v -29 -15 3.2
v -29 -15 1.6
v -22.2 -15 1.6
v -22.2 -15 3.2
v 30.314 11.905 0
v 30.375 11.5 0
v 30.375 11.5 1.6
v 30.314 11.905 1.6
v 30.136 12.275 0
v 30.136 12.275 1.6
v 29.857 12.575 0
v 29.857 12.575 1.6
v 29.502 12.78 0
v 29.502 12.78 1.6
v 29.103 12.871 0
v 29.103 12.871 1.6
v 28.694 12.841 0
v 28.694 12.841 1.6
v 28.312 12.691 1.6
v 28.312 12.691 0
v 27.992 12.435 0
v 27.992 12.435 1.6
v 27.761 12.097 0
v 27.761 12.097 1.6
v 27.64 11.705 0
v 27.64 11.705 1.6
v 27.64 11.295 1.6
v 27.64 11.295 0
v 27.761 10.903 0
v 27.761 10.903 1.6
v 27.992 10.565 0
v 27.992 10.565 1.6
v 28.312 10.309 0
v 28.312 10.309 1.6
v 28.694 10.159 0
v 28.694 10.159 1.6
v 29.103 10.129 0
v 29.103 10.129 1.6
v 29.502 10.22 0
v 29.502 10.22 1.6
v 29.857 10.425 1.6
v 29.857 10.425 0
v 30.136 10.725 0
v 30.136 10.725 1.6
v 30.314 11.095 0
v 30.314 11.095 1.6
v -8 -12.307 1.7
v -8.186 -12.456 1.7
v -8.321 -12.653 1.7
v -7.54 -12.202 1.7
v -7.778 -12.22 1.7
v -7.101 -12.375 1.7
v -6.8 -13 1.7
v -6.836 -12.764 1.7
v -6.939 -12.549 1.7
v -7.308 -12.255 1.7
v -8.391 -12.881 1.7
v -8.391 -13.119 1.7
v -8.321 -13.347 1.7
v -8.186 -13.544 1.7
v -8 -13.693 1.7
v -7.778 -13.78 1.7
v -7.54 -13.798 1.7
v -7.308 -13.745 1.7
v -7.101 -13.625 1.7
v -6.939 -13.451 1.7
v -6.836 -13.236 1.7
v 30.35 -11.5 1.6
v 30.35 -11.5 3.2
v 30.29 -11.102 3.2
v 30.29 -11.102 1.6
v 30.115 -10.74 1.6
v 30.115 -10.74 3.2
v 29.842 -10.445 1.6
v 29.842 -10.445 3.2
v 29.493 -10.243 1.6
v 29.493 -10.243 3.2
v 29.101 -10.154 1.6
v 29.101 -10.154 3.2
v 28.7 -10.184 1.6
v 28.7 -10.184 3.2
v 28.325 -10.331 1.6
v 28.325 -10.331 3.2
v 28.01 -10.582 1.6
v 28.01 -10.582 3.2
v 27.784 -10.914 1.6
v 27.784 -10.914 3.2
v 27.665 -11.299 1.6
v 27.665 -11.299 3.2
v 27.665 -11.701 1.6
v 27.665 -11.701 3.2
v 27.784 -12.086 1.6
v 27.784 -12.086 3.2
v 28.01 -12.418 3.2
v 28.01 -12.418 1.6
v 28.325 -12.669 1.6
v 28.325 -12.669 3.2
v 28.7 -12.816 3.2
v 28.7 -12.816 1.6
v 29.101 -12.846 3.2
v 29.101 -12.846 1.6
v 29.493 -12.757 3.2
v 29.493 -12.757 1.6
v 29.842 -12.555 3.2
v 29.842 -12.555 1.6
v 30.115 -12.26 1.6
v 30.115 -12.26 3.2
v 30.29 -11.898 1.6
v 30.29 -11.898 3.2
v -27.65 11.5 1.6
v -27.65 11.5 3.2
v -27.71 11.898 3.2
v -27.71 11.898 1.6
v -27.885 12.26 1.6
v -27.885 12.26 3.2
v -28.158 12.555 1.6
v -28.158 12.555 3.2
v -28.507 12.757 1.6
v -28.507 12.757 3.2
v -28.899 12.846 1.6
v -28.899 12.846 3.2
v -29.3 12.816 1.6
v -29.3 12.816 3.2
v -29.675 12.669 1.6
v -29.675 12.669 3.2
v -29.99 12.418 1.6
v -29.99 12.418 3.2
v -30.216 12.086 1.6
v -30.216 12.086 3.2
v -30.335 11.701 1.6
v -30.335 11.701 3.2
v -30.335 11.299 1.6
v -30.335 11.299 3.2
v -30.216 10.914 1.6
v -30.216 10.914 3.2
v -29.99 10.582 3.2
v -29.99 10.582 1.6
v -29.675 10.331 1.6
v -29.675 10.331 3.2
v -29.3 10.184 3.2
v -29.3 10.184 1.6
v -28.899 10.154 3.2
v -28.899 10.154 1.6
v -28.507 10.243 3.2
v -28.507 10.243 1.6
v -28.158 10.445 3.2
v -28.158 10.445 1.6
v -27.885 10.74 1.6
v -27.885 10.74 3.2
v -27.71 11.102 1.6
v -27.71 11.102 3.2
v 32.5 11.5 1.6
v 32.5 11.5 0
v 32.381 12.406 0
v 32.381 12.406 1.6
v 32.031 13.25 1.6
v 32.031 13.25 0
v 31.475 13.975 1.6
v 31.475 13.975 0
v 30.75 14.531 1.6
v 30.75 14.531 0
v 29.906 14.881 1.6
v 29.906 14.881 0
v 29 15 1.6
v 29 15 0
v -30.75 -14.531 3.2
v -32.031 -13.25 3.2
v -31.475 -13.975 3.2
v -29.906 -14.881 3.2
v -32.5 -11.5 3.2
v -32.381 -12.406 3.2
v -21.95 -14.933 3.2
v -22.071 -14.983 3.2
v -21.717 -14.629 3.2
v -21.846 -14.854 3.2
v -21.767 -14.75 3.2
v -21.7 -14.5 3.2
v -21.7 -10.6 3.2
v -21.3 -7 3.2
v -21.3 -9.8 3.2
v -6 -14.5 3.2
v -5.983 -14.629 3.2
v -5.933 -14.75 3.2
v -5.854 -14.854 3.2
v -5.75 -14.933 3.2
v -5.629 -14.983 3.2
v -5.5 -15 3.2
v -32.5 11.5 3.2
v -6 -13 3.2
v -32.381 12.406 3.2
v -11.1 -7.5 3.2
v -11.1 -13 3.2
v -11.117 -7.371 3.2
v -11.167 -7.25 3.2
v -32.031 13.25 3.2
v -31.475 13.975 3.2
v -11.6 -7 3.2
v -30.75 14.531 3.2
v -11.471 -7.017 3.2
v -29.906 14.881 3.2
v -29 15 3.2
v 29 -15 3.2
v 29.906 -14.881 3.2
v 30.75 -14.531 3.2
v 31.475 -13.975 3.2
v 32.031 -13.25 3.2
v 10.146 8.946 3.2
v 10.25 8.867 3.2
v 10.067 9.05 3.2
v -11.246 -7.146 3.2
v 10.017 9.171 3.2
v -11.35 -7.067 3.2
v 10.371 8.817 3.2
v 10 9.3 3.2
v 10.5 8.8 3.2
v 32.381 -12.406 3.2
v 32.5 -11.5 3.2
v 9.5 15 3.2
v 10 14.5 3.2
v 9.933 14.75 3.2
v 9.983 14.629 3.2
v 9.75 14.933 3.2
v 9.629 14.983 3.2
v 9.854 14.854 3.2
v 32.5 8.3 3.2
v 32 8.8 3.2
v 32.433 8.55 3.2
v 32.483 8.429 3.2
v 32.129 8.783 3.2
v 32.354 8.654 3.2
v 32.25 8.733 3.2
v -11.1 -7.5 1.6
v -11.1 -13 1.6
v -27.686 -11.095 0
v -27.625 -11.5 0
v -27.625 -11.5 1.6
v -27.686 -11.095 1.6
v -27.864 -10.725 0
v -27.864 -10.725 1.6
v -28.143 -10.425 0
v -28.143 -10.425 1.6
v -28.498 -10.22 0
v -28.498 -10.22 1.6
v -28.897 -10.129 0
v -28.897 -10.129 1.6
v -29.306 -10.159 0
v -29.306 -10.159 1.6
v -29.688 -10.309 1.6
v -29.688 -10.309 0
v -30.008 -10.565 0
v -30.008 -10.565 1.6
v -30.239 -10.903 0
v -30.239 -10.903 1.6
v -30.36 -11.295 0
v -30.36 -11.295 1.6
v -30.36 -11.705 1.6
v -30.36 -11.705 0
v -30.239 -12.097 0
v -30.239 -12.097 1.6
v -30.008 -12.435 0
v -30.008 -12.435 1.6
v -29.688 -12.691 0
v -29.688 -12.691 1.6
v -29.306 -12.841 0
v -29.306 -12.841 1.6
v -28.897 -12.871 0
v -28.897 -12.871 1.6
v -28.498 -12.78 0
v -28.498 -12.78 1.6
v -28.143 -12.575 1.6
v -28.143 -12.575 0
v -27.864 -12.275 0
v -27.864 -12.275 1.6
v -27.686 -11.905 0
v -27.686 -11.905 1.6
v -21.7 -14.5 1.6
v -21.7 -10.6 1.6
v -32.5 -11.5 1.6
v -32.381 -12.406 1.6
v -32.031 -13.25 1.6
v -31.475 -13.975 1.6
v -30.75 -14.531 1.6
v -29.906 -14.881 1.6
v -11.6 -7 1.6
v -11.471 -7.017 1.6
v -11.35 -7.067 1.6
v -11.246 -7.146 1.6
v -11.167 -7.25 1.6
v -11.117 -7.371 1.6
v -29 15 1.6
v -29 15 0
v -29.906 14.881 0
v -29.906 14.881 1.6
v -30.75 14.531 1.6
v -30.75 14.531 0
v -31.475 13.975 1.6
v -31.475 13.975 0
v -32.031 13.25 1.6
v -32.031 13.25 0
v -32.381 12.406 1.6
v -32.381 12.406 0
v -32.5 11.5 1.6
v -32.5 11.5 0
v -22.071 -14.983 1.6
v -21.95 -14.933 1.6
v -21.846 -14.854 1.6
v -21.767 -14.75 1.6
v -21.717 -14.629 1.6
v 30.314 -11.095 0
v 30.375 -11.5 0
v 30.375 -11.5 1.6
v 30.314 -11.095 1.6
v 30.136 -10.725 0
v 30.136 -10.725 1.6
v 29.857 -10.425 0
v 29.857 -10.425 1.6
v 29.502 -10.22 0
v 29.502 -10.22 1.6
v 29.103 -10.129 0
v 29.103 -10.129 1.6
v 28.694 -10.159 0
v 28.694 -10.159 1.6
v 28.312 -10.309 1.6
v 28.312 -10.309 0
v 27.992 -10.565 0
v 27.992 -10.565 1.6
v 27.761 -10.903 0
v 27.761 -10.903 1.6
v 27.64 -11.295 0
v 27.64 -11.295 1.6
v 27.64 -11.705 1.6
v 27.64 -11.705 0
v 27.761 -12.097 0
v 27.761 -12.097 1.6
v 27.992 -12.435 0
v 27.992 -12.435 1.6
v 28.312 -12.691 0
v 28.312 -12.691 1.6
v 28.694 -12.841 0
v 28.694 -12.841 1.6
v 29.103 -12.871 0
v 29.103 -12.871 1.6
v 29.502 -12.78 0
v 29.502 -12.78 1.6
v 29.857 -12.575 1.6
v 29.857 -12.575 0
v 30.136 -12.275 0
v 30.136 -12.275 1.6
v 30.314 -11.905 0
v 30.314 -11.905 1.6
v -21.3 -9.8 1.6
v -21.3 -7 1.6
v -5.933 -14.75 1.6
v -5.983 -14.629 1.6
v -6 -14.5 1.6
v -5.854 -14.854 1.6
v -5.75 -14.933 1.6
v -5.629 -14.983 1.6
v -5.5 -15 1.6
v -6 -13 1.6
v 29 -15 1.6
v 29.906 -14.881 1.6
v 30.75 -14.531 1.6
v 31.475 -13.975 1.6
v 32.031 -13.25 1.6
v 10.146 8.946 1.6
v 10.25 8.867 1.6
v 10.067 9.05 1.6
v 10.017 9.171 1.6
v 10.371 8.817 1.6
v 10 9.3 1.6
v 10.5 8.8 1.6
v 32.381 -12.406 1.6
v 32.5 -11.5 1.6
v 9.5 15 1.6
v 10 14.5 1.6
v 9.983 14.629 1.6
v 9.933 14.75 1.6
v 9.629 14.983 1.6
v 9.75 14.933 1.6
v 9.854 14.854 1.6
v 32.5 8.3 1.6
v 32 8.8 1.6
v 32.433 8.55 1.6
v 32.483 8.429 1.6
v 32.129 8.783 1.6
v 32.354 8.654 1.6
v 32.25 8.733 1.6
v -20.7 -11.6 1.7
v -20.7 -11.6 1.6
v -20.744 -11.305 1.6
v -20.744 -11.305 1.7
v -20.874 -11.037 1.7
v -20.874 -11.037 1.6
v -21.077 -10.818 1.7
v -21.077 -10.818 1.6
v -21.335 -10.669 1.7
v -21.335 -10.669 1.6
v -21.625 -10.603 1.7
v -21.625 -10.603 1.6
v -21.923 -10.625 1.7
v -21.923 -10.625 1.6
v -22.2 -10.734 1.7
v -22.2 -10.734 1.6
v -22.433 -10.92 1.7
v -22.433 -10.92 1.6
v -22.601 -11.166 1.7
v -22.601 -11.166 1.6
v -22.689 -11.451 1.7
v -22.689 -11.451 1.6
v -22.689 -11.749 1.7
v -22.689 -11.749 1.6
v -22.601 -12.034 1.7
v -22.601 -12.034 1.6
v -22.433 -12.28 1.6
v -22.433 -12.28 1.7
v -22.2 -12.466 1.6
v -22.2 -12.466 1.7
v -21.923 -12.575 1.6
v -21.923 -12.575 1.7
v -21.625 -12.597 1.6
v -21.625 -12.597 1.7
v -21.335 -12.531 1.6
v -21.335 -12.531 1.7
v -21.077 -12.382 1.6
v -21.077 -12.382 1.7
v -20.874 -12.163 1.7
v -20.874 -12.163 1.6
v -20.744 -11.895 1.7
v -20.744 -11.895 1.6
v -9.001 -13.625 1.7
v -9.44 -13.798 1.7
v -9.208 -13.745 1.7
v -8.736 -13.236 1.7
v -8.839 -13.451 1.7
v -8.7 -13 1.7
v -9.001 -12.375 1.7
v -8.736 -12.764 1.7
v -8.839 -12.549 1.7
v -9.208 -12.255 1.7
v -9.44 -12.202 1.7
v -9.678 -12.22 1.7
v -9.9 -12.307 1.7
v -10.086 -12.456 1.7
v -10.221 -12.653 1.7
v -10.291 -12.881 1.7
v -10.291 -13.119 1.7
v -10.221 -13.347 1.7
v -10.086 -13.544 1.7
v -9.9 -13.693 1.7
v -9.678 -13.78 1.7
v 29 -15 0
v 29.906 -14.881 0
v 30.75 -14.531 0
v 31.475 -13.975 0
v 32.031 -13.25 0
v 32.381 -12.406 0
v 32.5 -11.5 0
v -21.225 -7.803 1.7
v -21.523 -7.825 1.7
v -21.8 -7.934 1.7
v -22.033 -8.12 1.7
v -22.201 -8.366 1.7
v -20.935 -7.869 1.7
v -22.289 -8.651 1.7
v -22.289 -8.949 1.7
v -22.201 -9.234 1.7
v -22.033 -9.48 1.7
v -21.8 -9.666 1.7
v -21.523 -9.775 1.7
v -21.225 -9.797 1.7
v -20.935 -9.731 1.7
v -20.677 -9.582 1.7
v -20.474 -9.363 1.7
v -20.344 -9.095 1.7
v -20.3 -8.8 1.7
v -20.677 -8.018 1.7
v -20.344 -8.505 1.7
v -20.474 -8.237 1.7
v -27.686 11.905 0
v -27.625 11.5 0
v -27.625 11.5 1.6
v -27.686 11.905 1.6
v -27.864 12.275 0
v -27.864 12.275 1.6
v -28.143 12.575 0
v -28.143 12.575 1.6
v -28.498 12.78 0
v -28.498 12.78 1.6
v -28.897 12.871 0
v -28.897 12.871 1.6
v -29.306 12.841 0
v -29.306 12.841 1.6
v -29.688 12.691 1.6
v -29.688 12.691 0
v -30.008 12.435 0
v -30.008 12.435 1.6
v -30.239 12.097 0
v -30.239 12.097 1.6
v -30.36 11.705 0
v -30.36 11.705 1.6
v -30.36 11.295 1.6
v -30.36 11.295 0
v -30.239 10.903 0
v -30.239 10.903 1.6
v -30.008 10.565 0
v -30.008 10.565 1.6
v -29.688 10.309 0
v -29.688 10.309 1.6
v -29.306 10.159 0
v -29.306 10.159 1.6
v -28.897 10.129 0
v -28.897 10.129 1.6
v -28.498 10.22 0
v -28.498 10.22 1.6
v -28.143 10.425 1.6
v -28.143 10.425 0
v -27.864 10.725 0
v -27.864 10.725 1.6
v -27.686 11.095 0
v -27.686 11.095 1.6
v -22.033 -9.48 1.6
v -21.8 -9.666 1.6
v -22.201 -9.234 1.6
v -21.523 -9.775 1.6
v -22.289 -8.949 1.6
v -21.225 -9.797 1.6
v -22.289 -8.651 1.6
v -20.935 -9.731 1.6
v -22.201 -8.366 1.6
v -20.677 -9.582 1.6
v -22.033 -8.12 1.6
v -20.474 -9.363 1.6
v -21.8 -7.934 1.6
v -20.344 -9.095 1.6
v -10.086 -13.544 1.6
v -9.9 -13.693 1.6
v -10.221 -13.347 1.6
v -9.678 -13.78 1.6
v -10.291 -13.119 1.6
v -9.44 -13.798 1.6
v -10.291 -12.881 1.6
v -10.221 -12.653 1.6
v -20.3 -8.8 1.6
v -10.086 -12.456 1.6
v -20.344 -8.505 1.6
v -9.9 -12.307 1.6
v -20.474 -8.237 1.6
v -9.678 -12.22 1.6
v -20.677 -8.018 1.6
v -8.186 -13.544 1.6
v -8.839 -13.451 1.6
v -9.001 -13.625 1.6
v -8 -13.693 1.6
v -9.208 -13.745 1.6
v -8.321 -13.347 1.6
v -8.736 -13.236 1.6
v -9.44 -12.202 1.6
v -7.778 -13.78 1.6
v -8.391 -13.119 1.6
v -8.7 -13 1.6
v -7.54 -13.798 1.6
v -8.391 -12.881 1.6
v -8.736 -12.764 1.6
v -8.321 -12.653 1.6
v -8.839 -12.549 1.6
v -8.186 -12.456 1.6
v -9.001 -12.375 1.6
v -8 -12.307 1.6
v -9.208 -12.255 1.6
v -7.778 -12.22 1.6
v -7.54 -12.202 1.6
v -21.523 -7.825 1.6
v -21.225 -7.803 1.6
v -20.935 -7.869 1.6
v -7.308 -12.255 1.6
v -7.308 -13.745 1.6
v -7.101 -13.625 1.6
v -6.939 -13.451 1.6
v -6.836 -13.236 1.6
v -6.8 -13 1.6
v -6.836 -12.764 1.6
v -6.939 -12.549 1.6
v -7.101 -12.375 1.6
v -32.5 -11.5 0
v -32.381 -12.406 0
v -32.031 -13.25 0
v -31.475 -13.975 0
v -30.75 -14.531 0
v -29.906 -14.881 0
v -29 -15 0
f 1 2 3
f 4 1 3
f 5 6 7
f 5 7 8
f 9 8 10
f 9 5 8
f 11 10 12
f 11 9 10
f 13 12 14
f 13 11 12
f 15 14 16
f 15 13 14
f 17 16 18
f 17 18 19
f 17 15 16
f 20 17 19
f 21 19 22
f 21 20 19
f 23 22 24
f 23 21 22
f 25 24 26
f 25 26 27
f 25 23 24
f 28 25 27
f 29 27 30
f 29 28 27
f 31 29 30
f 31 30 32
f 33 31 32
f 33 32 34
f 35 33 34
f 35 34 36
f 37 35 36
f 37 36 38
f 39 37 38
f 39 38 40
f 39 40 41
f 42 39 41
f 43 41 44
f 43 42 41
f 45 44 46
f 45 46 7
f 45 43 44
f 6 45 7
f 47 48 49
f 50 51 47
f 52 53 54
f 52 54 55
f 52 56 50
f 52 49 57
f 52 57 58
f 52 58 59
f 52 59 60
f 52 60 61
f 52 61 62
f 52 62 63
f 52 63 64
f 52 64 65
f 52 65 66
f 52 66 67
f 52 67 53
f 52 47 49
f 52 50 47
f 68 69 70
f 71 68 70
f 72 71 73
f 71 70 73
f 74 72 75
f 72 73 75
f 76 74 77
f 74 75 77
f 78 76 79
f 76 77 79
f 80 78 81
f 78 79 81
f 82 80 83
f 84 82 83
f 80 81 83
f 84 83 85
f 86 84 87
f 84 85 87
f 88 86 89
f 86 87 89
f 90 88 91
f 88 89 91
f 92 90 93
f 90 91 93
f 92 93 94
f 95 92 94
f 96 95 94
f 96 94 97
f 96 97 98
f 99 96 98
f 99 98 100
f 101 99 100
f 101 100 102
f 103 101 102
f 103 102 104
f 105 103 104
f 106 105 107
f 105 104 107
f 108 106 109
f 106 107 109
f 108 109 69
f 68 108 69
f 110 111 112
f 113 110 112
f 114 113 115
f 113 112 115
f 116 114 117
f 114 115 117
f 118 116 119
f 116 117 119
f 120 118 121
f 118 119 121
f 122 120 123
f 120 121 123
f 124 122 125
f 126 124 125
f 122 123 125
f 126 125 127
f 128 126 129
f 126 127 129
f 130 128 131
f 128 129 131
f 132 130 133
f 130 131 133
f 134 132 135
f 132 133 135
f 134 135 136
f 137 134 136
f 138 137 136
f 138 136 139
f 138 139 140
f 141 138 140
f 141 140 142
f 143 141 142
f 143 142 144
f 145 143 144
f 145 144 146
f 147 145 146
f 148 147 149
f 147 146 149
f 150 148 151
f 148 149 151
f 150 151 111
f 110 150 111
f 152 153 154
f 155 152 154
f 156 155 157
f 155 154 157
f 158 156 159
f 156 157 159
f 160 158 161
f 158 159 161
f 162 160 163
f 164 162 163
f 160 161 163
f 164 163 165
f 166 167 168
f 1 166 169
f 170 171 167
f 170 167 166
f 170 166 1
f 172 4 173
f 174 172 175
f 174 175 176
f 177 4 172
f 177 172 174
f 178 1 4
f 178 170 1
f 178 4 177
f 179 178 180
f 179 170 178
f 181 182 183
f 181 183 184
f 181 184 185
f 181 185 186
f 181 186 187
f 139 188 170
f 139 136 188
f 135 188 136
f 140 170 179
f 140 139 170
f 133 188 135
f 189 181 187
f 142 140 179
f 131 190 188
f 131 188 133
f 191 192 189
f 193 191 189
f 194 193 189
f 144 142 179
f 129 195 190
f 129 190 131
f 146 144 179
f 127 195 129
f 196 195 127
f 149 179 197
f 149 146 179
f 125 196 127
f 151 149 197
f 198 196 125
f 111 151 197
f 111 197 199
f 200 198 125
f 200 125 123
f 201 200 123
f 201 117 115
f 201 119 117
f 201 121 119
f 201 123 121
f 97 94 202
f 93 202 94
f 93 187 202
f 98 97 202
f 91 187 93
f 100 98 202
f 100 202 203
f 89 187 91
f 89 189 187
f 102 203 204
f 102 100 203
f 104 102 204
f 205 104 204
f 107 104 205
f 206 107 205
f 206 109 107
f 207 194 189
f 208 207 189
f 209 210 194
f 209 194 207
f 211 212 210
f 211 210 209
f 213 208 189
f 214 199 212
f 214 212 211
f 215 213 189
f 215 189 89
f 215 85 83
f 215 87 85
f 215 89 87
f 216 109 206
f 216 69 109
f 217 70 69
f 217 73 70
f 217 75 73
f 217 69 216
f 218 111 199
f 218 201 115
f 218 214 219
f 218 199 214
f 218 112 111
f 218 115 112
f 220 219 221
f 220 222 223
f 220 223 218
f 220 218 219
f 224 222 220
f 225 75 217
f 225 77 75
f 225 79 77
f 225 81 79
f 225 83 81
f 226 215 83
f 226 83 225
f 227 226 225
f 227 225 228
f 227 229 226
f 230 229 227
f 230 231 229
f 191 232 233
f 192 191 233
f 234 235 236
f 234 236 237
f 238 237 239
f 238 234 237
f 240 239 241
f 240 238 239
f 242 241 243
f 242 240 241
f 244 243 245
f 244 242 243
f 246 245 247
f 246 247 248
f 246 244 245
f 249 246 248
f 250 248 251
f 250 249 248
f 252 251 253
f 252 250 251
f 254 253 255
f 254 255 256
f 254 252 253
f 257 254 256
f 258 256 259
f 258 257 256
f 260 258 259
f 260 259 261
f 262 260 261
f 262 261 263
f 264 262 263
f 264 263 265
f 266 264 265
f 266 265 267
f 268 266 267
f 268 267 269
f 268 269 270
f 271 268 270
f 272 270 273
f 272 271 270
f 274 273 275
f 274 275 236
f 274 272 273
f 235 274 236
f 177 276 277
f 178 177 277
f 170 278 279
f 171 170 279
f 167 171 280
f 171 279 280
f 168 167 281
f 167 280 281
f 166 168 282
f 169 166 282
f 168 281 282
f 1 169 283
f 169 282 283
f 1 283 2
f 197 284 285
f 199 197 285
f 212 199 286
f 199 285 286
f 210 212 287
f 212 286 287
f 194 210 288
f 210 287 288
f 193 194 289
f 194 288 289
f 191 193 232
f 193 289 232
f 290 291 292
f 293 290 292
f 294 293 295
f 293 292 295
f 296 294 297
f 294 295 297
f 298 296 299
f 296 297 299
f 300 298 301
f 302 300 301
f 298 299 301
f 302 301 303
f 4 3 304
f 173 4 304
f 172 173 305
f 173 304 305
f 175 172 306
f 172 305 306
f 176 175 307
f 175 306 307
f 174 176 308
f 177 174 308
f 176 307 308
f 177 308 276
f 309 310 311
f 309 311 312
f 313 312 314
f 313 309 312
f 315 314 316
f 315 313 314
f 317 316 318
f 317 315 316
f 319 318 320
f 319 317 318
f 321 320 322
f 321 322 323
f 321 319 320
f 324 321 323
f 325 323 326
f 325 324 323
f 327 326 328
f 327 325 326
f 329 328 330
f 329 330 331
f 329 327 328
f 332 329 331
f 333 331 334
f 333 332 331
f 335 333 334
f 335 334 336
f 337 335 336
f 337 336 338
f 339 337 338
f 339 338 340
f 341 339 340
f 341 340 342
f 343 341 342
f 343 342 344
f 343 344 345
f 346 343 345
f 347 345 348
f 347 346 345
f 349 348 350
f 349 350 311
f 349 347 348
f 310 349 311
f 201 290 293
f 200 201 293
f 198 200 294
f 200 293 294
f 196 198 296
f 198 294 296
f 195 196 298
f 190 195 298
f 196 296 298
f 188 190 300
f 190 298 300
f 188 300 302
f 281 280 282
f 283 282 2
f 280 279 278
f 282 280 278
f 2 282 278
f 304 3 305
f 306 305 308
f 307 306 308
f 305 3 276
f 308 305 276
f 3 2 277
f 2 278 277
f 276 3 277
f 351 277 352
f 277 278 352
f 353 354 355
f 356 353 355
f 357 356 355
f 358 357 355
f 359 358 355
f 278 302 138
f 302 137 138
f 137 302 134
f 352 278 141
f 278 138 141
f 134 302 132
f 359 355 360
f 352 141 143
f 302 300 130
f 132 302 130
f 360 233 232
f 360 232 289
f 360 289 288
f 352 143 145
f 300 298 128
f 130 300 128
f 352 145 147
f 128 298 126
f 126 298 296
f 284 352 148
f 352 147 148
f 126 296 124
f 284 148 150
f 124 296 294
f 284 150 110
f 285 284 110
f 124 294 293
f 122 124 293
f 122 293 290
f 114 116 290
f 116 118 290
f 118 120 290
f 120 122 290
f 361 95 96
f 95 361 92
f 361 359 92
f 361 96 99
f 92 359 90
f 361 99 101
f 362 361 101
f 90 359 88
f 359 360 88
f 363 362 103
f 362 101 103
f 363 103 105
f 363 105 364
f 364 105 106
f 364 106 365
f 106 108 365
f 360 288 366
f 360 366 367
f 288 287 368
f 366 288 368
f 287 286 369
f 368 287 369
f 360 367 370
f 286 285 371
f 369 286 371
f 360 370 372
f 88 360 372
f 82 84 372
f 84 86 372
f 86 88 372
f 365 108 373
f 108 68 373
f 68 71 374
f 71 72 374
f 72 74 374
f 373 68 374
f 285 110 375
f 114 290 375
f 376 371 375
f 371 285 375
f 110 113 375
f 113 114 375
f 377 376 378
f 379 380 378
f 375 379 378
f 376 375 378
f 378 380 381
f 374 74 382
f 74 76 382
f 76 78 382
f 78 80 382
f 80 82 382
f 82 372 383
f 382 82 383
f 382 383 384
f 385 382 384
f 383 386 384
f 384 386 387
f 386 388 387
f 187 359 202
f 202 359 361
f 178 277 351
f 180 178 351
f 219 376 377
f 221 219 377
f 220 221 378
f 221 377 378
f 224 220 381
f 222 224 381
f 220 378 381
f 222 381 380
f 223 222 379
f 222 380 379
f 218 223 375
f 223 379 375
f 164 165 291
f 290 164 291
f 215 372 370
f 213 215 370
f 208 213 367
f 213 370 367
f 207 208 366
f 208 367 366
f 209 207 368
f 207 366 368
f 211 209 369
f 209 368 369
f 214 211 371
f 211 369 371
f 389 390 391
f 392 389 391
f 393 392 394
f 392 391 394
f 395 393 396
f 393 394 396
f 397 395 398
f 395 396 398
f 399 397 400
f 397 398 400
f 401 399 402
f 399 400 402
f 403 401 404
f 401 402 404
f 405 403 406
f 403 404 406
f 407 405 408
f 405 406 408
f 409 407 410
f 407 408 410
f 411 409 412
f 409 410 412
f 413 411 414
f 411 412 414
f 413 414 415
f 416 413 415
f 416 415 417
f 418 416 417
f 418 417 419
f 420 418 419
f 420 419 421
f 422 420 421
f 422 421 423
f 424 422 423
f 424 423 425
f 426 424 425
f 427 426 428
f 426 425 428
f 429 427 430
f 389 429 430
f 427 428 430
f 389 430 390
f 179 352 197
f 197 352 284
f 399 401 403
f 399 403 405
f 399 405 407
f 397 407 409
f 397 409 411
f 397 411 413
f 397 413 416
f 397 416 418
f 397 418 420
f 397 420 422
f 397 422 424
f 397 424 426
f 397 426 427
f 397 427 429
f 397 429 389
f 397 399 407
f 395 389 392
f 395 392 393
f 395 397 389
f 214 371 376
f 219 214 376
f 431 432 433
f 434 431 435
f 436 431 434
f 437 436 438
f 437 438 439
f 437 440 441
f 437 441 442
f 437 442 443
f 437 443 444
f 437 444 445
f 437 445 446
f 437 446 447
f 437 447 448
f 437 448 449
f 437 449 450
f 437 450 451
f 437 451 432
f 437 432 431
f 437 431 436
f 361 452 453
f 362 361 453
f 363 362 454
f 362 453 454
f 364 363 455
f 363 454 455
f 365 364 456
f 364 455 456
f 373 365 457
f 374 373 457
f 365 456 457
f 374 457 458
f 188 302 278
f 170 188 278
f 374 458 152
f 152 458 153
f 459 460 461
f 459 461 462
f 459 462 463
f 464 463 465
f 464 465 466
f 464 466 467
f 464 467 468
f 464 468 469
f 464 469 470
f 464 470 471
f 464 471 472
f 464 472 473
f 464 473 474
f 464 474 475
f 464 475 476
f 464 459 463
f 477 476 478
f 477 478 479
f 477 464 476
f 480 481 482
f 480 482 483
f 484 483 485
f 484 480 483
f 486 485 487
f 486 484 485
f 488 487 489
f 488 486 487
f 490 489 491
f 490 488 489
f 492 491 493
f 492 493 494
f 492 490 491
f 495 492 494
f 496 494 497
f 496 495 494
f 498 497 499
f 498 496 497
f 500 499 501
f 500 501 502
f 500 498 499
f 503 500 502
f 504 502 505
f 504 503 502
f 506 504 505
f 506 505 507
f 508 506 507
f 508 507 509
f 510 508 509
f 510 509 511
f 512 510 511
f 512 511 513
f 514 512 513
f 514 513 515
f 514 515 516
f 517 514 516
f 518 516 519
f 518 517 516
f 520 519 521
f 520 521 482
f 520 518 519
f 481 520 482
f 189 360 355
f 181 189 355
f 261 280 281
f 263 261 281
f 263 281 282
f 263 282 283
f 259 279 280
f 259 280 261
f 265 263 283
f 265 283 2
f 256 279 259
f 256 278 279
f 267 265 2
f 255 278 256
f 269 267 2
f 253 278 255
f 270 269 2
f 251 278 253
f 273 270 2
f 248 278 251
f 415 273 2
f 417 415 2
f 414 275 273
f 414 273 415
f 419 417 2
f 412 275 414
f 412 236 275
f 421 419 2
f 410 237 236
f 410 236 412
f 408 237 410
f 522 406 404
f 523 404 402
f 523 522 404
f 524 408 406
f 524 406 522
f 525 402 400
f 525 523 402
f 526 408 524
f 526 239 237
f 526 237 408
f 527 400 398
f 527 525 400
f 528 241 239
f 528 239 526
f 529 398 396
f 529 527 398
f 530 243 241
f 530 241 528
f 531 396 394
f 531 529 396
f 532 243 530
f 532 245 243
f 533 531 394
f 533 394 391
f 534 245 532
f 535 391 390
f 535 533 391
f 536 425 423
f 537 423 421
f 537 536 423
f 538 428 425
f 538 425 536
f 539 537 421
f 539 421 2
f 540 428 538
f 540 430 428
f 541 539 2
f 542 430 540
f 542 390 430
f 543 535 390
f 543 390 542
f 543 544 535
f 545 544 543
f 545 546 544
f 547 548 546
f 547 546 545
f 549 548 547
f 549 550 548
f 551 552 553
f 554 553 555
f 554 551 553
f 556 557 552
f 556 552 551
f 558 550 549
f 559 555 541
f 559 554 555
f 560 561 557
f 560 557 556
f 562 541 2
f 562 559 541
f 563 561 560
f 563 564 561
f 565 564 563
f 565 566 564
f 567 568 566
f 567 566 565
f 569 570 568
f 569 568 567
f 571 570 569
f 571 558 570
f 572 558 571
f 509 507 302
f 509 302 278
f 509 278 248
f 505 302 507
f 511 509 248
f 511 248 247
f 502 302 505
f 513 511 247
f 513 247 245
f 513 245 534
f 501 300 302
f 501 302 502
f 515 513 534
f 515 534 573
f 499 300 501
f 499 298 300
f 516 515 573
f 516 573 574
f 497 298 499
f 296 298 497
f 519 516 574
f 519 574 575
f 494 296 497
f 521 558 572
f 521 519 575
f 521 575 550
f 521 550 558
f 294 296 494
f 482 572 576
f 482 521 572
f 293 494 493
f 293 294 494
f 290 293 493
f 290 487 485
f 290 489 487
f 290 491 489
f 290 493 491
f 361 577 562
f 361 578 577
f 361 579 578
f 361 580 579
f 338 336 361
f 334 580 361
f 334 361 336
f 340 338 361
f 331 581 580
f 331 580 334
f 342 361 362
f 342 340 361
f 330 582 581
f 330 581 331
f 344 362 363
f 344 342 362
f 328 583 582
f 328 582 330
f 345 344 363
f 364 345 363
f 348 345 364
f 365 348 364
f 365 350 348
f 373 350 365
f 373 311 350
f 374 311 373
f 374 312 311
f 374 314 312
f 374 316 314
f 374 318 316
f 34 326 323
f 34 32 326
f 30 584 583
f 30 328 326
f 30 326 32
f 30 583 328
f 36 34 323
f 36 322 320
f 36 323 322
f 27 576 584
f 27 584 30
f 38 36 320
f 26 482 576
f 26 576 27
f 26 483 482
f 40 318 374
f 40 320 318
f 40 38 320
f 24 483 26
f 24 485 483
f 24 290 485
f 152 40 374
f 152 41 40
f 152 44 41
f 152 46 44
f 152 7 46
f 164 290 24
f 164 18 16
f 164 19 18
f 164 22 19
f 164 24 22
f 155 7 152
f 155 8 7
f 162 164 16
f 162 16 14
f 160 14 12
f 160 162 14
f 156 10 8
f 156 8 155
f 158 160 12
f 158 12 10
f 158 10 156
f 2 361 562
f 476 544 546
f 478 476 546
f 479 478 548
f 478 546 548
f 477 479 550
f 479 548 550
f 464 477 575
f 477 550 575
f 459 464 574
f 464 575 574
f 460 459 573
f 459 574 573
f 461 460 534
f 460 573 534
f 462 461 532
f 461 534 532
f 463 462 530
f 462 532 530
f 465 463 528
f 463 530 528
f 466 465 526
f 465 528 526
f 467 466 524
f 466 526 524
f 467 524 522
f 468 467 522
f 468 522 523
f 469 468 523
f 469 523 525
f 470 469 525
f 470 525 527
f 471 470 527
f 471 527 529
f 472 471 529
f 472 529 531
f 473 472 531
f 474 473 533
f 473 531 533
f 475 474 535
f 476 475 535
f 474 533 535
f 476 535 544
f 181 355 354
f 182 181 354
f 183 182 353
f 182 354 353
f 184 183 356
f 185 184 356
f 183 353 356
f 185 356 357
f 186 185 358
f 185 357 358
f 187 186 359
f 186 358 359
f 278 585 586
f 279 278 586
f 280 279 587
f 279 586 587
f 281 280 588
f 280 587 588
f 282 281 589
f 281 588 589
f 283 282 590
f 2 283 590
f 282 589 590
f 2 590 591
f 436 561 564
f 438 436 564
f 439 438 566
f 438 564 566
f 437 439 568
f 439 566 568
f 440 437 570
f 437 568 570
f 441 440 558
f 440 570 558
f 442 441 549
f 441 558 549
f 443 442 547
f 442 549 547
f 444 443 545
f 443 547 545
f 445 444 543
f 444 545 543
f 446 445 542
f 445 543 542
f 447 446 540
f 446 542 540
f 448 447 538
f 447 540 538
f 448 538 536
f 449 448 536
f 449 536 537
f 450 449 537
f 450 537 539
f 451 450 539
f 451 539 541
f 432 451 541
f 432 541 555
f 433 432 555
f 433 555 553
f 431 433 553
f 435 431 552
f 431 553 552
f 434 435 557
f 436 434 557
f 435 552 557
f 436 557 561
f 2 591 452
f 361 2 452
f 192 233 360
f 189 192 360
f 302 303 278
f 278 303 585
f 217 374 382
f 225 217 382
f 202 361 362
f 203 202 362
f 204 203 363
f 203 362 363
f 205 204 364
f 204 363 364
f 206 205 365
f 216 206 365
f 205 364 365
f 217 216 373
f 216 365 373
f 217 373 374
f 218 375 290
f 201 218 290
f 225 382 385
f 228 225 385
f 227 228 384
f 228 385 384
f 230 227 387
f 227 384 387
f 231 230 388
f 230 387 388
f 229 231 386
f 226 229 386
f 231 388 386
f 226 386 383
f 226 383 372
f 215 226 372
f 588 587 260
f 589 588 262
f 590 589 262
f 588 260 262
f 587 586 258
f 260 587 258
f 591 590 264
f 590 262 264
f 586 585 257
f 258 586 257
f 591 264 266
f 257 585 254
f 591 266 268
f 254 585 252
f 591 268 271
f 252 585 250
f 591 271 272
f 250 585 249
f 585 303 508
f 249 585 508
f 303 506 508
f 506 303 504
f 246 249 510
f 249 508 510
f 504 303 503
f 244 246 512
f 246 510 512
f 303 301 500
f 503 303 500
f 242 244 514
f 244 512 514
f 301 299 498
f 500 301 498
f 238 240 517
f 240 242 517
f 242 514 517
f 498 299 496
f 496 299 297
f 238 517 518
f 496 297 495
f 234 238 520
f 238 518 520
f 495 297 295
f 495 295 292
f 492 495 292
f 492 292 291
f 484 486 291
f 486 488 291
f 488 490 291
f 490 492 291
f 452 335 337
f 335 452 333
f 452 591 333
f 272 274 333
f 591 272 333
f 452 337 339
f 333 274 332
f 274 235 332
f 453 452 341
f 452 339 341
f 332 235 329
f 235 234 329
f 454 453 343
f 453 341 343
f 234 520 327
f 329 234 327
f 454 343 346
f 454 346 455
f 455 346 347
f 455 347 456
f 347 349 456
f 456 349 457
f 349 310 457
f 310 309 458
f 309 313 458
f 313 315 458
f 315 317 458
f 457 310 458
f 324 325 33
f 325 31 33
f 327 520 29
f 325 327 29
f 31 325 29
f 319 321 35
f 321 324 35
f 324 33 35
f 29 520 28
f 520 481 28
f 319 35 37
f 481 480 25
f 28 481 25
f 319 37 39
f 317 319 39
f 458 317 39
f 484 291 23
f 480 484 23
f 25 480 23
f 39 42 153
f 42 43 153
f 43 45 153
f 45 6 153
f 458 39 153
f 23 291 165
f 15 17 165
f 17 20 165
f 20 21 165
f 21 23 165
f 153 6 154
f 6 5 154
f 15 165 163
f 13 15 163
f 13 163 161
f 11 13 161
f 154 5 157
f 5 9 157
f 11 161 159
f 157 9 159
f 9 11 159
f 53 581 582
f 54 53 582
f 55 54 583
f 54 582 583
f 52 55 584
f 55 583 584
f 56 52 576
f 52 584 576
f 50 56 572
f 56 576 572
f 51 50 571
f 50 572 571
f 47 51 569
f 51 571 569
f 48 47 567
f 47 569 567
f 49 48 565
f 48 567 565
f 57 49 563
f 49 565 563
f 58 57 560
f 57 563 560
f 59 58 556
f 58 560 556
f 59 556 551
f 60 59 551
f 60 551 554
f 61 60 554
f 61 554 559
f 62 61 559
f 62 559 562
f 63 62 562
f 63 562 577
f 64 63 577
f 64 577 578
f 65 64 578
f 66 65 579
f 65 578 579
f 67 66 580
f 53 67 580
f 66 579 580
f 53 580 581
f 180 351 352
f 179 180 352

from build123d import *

# Parameters (mm, degrees)
F0_R     = 1.375
F1_DEPTH = 1.6
F2_R     = 1
F2_R_2   = 0.8
F3_DEPTH = 0.1
F5_DEPTH = 1.6
F6_R     = 1.35
F8_DEPTH = 1.6


with BuildPart() as f1:
    # F0 (on Top) → F1 (new body)
    with BuildSketch(Plane.XY):
        with BuildLine():
            ThreePointArc((32.5, 11.5), (31.474874, 13.974874), (29, 15))
            Line((29, 15), (-29, 15))
            ThreePointArc((-29, 15), (-31.474874, 13.974874), (-32.5, 11.5))
            Line((-32.5, 11.5), (-32.5, -11.5))
            ThreePointArc((-32.5, -11.5), (-31.474874, -13.974874), (-29, -15))
            Line((-29, -15), (29, -15))
            ThreePointArc((29, -15), (31.474874, -13.974874), (32.5, -11.5))
            Line((32.5, -11.5), (32.5, 11.5))
        make_face()
        with Locations((-29, -11.5)):
            Circle(F0_R, mode=Mode.SUBTRACT)
        with Locations((29, -11.5)):
            Circle(F0_R, mode=Mode.SUBTRACT)
        with Locations((-29, 11.5)):
            Circle(F0_R, mode=Mode.SUBTRACT)
        with Locations((29, 11.5)):
            Circle(F0_R, mode=Mode.SUBTRACT)
    extrude(amount=F1_DEPTH)

    # F2 (on face) → F3 (join)
    with BuildSketch(Plane.XY.offset(1.6)):
        with Locations((-21.7, -11.6)):
            Circle(F2_R)
        with Locations((-21.3, -8.8)):
            Circle(F2_R)
        with Locations((-9.5, -13)):
            Circle(F2_R_2)
        with Locations((-7.6, -13)):
            Circle(F2_R_2)
    extrude(amount=F3_DEPTH)


with BuildPart() as f5:
    # F4 (on face) → F5 (new body)
    with BuildSketch(Plane.XY.offset(1.6)):
        with BuildLine():
            ThreePointArc((10, 14.5), (9.853553, 14.853553), (9.5, 15))
            Line((9.5, 15), (-29, 15))
            ThreePointArc((-29, 15), (-31.474874, 13.974874), (-32.5, 11.5))
            Line((-32.5, 11.5), (-32.5, -11.5))
            ThreePointArc((-32.5, -11.5), (-31.474874, -13.974874), (-29, -15))
            Line((-29, -15), (-22.2, -15))
            ThreePointArc((-22.2, -15), (-21.846447, -14.853553), (-21.7, -14.5))
            Line((-21.7, -14.5), (-21.7, -10.6))
            Line((-21.7, -10.6), (-21.3, -9.8))
            Line((-21.3, -9.8), (-21.3, -7.8))
            Line((-21.3, -7.8), (-21.3, -7))
            Line((-21.3, -7), (-11.6, -7))
            ThreePointArc((-11.6, -7), (-11.246447, -7.146447), (-11.1, -7.5))
            Line((-11.1, -7.5), (-11.1, -13))
            Line((-11.1, -13), (-9.5, -13))
            Line((-9.5, -13), (-7.6, -13))
            Line((-7.6, -13), (-6, -13))
            Line((-6, -13), (-6, -14.5))
            ThreePointArc((-6, -14.5), (-5.853553, -14.853553), (-5.5, -15))
            Line((-5.5, -15), (29, -15))
            ThreePointArc((29, -15), (31.474874, -13.974874), (32.5, -11.5))
            Line((32.5, -11.5), (32.5, 8.3))
            ThreePointArc((32.5, 8.3), (32.353553, 8.653553), (32, 8.8))
            Line((32, 8.8), (10.5, 8.8))
            ThreePointArc((10.5, 8.8), (10.146447, 8.946447), (10, 9.3))
            Line((10, 9.3), (10, 14.5))
        make_face()
    extrude(amount=F5_DEPTH)

    # F6 (on face) → F8 (cut)
    with BuildSketch(Plane.XY.offset(3.2)):
        with Locations((-29, 11.5)):
            Circle(F6_R)
        with Locations((29, -11.5)):
            Circle(F6_R)
    extrude(amount=-F8_DEPTH, mode=Mode.SUBTRACT)


solid = Compound([f1.part, f5.part])
